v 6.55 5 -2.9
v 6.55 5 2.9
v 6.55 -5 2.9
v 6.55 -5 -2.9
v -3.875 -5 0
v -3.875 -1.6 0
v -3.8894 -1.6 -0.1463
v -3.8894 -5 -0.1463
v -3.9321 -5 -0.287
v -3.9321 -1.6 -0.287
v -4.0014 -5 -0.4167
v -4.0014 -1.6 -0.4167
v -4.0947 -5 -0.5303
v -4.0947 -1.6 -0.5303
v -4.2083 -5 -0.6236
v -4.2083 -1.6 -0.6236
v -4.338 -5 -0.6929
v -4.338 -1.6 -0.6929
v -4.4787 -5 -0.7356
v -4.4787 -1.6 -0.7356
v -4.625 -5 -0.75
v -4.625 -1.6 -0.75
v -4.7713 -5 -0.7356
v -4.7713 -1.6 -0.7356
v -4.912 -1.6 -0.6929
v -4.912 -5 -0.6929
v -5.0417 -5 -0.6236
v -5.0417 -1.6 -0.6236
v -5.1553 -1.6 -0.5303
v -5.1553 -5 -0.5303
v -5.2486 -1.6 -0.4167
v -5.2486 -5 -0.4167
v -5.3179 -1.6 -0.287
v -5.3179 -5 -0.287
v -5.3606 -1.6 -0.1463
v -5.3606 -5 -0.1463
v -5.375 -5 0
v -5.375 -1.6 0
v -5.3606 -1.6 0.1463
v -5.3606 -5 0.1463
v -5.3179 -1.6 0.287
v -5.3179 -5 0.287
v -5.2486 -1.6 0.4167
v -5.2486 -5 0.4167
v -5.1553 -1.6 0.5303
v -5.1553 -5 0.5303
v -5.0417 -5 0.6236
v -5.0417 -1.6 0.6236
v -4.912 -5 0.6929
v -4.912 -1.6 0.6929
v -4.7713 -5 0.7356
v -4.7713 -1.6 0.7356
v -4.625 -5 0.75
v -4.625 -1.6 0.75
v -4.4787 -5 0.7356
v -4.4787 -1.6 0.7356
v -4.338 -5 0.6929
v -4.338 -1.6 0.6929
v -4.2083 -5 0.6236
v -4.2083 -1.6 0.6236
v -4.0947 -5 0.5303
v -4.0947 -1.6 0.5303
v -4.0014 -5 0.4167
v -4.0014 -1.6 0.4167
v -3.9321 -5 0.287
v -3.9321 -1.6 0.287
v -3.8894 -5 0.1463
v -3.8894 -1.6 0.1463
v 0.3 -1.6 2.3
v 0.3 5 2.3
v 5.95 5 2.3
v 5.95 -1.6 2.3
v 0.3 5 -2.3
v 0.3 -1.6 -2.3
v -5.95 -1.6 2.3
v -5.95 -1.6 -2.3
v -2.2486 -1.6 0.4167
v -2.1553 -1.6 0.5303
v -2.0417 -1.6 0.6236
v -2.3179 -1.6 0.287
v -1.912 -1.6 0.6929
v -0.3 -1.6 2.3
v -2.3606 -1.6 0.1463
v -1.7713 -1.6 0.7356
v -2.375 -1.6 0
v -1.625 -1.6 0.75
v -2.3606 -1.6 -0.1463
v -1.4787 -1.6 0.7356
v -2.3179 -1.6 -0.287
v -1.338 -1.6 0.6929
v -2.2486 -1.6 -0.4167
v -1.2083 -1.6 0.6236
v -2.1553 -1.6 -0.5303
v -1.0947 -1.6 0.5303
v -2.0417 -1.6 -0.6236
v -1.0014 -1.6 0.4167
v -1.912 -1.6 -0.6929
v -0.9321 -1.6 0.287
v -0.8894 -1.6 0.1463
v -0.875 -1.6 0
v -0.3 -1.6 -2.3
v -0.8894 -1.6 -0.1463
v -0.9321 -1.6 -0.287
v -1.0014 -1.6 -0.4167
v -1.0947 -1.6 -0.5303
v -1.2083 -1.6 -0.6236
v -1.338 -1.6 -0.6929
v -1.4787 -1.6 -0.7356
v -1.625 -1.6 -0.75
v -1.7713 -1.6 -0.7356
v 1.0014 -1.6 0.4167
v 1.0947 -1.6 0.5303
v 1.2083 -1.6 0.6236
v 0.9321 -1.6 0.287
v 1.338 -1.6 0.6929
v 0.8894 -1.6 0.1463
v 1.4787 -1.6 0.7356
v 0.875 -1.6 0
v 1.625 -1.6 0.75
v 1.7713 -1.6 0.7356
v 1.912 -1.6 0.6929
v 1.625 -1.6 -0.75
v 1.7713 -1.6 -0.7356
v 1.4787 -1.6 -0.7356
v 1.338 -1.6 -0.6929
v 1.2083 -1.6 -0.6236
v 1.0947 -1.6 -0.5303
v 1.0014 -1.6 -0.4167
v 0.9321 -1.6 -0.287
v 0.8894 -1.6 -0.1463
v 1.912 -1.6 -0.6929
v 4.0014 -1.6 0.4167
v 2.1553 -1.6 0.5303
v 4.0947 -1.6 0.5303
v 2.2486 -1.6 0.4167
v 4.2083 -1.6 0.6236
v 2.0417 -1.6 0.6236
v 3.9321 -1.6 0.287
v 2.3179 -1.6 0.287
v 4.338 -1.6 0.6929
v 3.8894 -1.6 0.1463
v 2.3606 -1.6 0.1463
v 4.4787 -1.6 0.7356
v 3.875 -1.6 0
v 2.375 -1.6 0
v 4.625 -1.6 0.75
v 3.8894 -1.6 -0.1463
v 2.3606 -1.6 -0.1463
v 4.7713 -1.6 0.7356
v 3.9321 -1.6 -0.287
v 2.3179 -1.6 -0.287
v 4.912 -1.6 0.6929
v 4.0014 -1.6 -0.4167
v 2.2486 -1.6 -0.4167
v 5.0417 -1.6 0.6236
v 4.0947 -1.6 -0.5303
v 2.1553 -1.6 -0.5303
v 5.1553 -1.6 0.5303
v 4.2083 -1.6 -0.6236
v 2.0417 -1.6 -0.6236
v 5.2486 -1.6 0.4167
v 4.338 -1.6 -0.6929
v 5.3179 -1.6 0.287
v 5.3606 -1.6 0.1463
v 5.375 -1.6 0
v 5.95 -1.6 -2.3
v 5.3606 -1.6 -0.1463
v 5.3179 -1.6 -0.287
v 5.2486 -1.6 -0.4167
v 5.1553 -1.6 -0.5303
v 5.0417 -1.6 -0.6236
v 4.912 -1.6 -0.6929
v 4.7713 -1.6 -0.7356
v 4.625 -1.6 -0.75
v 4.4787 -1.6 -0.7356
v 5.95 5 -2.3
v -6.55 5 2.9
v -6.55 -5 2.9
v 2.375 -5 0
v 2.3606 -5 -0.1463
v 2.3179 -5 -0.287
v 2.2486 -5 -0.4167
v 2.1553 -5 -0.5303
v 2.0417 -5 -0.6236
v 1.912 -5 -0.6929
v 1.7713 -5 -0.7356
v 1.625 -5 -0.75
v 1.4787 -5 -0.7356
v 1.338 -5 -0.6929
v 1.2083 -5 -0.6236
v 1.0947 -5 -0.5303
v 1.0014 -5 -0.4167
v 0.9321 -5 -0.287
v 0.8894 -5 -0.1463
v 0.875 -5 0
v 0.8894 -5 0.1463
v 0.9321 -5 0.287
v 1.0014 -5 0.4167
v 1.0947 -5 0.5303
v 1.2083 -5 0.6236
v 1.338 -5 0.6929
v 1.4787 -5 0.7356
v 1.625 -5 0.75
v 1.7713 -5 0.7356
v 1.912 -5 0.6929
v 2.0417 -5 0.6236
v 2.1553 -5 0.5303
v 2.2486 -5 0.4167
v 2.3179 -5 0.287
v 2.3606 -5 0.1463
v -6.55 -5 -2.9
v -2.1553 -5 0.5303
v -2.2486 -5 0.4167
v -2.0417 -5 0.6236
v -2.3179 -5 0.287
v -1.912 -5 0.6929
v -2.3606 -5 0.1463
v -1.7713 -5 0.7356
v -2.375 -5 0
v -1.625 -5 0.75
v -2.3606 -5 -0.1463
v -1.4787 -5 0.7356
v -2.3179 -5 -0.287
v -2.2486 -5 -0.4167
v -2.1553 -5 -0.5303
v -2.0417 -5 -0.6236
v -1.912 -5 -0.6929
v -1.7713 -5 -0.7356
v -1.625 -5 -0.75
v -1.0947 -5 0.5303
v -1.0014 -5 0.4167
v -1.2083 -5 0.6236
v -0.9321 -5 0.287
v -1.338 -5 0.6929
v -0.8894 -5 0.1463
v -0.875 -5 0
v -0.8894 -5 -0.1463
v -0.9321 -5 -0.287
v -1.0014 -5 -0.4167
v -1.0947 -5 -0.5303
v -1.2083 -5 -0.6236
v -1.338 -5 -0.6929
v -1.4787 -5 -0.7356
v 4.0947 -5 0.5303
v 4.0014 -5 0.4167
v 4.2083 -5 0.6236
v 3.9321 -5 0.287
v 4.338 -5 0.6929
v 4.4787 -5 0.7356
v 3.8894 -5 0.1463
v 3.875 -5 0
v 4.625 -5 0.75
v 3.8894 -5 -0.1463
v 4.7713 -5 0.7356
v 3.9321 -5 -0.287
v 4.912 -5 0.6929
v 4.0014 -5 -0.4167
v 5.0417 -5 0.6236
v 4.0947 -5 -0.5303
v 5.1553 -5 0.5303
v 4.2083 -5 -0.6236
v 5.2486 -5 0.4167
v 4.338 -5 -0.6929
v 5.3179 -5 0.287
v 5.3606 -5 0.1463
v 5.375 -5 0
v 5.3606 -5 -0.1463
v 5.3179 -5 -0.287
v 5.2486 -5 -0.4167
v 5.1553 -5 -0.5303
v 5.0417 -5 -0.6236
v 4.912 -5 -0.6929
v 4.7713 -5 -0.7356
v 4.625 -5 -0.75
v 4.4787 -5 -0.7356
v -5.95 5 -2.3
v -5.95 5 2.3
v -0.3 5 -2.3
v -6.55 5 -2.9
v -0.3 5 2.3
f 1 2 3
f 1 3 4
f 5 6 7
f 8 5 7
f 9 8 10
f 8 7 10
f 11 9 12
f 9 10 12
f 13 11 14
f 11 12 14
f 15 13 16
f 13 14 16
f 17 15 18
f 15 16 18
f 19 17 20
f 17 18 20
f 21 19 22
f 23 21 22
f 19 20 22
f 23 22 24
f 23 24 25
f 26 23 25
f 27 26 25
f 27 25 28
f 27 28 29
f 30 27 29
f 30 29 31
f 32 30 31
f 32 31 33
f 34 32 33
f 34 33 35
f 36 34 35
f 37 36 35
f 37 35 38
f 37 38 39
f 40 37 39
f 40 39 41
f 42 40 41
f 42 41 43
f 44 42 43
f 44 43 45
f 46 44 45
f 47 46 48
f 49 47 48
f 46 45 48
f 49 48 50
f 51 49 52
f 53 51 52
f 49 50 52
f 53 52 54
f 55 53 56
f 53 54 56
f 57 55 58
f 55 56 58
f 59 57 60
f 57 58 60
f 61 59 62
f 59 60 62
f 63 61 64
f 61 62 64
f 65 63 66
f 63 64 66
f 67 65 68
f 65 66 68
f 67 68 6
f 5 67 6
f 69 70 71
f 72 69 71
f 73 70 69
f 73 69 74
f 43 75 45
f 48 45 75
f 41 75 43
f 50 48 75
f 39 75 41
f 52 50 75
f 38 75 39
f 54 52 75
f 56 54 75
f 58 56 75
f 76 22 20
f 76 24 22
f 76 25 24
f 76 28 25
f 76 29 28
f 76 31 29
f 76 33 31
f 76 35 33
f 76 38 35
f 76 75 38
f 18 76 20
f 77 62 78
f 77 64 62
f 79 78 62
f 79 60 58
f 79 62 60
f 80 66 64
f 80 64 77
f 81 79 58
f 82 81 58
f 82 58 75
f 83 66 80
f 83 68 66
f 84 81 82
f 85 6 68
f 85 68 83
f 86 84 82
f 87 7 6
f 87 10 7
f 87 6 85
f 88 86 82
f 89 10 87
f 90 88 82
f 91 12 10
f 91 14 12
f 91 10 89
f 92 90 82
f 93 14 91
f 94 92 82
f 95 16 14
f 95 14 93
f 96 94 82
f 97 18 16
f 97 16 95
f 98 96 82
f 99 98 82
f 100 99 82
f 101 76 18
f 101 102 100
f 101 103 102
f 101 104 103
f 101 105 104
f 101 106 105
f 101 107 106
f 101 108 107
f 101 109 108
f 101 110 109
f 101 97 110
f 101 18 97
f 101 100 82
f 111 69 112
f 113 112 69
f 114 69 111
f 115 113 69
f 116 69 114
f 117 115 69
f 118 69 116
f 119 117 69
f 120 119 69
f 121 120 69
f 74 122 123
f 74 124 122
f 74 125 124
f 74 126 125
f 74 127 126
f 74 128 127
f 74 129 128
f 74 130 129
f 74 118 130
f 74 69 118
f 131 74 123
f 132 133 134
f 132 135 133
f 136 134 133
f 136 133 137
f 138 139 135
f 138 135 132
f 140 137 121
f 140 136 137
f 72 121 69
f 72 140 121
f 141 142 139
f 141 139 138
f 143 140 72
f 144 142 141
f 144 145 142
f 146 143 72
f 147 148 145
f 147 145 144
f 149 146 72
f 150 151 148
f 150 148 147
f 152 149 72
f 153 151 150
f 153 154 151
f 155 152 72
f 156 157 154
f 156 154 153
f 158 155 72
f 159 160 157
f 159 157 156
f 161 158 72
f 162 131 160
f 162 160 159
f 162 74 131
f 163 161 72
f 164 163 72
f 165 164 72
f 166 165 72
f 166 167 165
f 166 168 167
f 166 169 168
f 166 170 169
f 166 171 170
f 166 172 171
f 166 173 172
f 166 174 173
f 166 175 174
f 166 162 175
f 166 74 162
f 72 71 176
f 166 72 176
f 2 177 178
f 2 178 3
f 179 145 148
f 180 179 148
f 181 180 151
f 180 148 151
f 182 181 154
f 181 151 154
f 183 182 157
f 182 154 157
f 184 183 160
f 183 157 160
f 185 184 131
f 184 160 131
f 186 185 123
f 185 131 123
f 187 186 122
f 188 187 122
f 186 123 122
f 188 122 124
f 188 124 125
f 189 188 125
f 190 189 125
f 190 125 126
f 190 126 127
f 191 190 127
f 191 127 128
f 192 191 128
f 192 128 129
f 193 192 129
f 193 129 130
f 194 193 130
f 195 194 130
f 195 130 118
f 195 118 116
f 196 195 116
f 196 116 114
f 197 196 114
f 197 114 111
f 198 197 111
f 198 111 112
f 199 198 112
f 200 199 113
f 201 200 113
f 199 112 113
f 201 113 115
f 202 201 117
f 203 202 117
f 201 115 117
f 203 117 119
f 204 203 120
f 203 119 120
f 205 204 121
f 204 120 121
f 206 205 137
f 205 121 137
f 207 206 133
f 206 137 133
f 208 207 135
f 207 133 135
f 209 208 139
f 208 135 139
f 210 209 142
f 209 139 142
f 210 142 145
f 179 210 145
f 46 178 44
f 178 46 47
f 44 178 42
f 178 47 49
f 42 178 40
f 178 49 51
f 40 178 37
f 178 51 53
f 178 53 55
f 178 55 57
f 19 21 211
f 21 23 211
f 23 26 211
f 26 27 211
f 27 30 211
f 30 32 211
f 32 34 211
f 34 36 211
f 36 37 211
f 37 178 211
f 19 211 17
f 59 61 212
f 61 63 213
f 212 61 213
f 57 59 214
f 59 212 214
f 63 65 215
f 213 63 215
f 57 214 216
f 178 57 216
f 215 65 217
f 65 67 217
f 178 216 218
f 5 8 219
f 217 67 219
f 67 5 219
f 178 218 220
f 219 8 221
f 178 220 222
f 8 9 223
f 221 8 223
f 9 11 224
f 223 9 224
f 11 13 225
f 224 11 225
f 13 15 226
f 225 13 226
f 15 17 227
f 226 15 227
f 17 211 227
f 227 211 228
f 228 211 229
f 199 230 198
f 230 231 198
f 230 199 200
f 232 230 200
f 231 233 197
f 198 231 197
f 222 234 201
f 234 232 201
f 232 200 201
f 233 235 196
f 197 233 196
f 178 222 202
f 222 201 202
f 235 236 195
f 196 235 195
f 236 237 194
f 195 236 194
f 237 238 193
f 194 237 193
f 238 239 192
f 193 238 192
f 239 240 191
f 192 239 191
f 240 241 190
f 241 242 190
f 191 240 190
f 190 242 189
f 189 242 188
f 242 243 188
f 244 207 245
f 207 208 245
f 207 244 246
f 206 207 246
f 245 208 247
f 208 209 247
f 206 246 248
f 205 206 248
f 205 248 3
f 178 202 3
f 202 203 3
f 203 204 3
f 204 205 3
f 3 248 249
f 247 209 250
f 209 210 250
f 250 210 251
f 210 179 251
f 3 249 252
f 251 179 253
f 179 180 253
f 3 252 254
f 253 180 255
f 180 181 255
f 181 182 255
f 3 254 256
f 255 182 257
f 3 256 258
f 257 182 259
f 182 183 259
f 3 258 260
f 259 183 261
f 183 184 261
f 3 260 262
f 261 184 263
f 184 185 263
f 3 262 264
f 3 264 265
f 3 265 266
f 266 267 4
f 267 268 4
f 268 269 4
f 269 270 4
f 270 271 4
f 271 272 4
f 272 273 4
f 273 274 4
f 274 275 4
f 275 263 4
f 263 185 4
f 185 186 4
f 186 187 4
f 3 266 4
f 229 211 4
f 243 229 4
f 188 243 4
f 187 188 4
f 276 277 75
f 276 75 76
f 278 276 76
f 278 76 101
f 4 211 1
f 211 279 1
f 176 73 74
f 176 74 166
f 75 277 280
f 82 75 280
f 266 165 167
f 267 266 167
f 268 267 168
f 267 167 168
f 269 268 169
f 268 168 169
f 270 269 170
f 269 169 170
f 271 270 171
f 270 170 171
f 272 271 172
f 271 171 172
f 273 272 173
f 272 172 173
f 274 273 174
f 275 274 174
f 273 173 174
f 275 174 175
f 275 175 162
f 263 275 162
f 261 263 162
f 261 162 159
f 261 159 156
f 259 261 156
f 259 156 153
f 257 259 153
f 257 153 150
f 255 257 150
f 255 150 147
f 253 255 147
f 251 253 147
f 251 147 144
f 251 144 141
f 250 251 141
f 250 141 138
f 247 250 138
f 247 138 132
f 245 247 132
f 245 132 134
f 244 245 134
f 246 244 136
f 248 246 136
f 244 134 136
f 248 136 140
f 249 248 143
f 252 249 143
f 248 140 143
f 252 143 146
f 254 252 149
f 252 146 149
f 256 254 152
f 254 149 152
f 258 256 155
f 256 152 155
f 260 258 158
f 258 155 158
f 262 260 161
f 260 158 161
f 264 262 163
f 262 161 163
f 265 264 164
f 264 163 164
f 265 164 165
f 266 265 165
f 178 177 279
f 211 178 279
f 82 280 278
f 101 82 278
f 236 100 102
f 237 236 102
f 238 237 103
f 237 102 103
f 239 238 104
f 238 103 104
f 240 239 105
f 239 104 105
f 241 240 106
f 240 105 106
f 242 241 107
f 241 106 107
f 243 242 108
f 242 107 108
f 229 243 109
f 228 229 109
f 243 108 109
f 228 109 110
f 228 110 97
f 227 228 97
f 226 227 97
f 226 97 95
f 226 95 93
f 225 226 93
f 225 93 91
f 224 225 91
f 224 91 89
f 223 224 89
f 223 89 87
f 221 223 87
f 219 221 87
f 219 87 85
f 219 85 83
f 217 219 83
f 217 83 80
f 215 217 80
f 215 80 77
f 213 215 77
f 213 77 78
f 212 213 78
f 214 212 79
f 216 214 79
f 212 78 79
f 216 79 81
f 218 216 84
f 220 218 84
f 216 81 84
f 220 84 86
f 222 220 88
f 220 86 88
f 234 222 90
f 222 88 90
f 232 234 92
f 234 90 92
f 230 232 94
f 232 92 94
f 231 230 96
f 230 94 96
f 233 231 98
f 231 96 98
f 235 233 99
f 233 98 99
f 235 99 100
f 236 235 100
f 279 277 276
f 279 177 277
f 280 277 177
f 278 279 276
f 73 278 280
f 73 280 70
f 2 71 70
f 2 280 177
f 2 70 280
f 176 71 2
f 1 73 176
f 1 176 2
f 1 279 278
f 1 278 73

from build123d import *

# Parameters (mm, degrees)
SKETCH1_W               = 13.1
SKETCH1_H               = 5.8
BOSS_EXTRUDE1_DEPTH     = 5
SKETCH10_W              = 5.65
SKETCH10_H              = 4.6
CUT_EXTRUDE7_DEPTH      = 6.6
SKETCH9_R               = 0.75
CUT_EXTRUDE6_DEPTH      = 6
CUT_EXTRUDE6_DEPTH_BACK = 6


with BuildPart() as part:
    # Sketch1 → Boss-Extrude1 (new body, symmetric)
    with BuildSketch(Plane(origin=(0, 0, 0), x_dir=(1, 0, 0), z_dir=(0, 1, 0))):
        Rectangle(SKETCH1_W, SKETCH1_H)
    extrude(amount=BOSS_EXTRUDE1_DEPTH, both=True)

    # Sketch10 → Cut-Extrude7 (cut)
    with BuildSketch(Plane(origin=(0, 5, 0), x_dir=(1, 0, 0), z_dir=(0, 1, 0))):
        with Locations((-3.125, 0)):
            Rectangle(SKETCH10_W, SKETCH10_H)
        with Locations((3.125, 0)):
            Rectangle(SKETCH10_W, SKETCH10_H)
    extrude(amount=-CUT_EXTRUDE7_DEPTH, mode=Mode.SUBTRACT)

    # Sketch9 → Cut-Extrude6 (cut, two sides)
    with BuildSketch(Plane(origin=(0, 0, 0), x_dir=(1, 0, 0), z_dir=(0, 1, 0))) as cut_extrude6_sk:
        with Locations((-4.625, 0)):
            Circle(SKETCH9_R)
        with Locations((-1.625, 0)):
            Circle(SKETCH9_R)
        with Locations((1.625, 0)):
            Circle(SKETCH9_R)
        with Locations((4.625, 0)):
            Circle(SKETCH9_R)
    extrude(amount=CUT_EXTRUDE6_DEPTH, mode=Mode.SUBTRACT)
    extrude(cut_extrude6_sk.sketch, amount=-CUT_EXTRUDE6_DEPTH_BACK, mode=Mode.SUBTRACT)


solid = part.part
